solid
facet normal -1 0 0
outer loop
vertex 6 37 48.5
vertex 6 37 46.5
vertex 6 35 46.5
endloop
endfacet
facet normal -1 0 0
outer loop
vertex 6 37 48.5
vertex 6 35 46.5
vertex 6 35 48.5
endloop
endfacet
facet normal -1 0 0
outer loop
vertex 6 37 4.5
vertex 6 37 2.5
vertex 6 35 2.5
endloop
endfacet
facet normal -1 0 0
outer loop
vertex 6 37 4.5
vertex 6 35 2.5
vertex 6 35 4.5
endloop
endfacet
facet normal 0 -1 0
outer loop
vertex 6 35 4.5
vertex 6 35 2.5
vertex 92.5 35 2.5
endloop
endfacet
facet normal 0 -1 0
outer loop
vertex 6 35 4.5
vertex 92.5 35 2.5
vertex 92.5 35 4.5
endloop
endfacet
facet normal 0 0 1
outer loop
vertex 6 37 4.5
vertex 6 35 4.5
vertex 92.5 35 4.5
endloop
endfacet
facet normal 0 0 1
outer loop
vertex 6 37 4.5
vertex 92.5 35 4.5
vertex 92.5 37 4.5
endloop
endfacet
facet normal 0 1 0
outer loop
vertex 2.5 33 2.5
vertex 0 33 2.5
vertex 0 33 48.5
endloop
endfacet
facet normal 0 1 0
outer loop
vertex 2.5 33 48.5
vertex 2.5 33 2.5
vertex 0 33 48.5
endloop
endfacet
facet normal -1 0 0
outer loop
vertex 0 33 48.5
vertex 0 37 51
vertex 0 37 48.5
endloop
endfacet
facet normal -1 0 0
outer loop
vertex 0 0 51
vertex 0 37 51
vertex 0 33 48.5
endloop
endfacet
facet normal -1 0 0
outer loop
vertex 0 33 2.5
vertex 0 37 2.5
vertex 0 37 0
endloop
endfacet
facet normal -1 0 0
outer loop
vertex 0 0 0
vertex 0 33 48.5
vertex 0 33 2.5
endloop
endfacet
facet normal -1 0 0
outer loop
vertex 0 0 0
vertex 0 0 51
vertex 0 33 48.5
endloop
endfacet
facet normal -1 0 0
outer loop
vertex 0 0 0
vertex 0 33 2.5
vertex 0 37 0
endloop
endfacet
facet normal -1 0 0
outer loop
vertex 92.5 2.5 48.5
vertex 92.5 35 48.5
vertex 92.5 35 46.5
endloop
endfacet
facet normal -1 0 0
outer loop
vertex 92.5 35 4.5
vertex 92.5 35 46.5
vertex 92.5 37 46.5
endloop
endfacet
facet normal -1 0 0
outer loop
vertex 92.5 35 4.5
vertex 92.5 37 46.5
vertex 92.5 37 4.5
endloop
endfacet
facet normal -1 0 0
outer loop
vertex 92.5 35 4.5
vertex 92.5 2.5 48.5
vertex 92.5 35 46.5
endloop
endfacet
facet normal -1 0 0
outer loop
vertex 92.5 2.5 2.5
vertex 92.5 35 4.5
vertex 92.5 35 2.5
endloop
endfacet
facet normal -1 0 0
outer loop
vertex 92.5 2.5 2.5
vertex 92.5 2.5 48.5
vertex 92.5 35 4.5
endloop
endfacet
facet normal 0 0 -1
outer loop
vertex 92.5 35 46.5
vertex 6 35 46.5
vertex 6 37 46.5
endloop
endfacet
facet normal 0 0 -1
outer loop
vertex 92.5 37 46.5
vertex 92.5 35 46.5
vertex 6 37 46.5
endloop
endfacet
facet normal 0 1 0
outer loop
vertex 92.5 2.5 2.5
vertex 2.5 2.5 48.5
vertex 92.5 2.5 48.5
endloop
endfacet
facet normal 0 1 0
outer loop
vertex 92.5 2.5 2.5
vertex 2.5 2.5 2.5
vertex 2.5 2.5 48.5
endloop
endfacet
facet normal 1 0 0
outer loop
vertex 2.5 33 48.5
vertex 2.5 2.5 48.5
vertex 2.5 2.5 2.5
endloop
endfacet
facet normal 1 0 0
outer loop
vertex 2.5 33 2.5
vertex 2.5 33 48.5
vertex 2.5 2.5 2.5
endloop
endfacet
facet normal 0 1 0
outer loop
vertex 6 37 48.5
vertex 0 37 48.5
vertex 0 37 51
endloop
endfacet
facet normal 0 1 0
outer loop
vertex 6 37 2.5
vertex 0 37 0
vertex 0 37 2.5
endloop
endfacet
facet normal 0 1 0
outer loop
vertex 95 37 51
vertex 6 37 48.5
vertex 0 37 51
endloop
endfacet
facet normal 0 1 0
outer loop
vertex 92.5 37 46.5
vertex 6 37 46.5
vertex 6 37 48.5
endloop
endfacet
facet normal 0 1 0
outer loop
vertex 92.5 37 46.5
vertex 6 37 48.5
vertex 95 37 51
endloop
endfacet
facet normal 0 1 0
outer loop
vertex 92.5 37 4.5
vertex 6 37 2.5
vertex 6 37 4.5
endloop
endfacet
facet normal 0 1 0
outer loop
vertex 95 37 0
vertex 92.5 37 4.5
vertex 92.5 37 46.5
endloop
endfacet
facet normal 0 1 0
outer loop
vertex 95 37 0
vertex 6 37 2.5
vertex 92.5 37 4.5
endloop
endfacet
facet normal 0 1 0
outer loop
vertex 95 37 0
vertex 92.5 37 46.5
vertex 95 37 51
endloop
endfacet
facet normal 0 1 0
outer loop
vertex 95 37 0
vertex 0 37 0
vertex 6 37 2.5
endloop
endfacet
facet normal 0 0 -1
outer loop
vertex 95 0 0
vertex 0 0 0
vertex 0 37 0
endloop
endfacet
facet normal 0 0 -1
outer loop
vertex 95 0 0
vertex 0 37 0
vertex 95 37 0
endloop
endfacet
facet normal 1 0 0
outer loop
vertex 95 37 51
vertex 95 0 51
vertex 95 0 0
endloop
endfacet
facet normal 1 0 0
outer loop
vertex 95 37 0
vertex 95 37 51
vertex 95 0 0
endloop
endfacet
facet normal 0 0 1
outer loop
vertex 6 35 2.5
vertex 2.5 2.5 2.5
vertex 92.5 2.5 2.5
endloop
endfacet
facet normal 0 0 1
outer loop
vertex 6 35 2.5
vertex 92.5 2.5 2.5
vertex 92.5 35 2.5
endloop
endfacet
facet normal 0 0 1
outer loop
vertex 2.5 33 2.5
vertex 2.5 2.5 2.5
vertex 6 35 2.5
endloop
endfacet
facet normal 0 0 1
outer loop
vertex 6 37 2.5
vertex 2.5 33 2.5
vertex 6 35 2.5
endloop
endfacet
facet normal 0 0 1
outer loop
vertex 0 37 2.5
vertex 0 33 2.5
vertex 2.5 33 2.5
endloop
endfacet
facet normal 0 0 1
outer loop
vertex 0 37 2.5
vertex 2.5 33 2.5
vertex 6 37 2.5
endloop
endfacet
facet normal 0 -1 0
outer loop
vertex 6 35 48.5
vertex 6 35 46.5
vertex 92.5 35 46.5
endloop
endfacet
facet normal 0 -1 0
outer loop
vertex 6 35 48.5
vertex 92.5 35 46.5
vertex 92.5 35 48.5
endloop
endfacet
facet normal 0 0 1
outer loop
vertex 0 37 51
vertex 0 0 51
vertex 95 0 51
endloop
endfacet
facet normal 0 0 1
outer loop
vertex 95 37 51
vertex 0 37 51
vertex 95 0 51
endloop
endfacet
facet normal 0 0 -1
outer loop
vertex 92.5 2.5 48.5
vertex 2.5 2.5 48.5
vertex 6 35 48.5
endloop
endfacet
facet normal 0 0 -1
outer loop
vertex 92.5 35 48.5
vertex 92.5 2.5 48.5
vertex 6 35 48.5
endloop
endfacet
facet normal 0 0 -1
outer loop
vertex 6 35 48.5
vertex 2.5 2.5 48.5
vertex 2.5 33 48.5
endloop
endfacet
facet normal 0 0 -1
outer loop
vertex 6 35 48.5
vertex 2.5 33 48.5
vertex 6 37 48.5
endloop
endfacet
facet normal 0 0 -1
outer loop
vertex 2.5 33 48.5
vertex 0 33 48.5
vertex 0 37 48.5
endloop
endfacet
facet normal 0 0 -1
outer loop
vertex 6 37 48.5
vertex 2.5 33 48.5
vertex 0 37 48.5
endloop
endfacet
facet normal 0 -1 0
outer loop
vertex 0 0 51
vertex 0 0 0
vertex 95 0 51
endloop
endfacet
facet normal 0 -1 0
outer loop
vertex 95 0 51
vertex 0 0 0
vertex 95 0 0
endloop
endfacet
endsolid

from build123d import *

# Parameters (mm, degrees)
ESBO_O1_W                = 95
ESBO_O1_H                = 51
RESSALTO_EXTRUS_O1_DEPTH = 2.5
ESBO_O2_W                = 95
ESBO_O2_H                = 51
ESBO_O2_W_2              = 90
ESBO_O2_H_2              = 46
RESSALTO_EXTRUS_O3_DEPTH = 37
ESBO_O3_W                = 46
ESBO_O3_H                = 4
CORTE_EXTRUS_O3_DEPTH    = 2.5
RESSALTO_EXTRUS_O7_START = -6
ESBO_O4_W                = 2
ESBO_O4_H                = 2
RESSALTO_EXTRUS_O7_DEPTH = 86.5


with BuildPart() as part:
    # Esboço1 → Ressalto-extrusão1 (new body)
    with BuildSketch(Plane(origin=(0, 0, 0), x_dir=(1, 0, 0), z_dir=(0, 1, 0))):
        with Locations((47.5, -25.5)):
            Rectangle(ESBO_O1_W, ESBO_O1_H)
    extrude(amount=RESSALTO_EXTRUS_O1_DEPTH)

    # Esboço2 → Ressalto-extrusão3 (add)
    with BuildSketch(Plane(origin=(0, 0, 0), x_dir=(1, 0, 0), z_dir=(0, 1, 0))):
        with Locations((47.5, -25.5)):
            Rectangle(ESBO_O2_W, ESBO_O2_H)
        with Locations((47.5, -25.5)):
            Rectangle(ESBO_O2_W_2, ESBO_O2_H_2, mode=Mode.SUBTRACT)
    extrude(amount=RESSALTO_EXTRUS_O3_DEPTH)

    # Esboço3 → Corte-extrusão3 (cut)
    with BuildSketch(Plane.ZY):
        with Locations((25.5, 35)):
            Rectangle(ESBO_O3_W, ESBO_O3_H)
    extrude(amount=-CORTE_EXTRUS_O3_DEPTH, mode=Mode.SUBTRACT)

    # Esboço4 → Ressalto-extrusão7 (add)
    with BuildSketch(Plane.ZY.offset(RESSALTO_EXTRUS_O7_START)):
        with Locations((3.5, 36)):
            Rectangle(ESBO_O4_W, ESBO_O4_H)
        with Locations((47.5, 36)):
            Rectangle(ESBO_O4_W, ESBO_O4_H)
    extrude(amount=-RESSALTO_EXTRUS_O7_DEPTH)


solid = part.part
